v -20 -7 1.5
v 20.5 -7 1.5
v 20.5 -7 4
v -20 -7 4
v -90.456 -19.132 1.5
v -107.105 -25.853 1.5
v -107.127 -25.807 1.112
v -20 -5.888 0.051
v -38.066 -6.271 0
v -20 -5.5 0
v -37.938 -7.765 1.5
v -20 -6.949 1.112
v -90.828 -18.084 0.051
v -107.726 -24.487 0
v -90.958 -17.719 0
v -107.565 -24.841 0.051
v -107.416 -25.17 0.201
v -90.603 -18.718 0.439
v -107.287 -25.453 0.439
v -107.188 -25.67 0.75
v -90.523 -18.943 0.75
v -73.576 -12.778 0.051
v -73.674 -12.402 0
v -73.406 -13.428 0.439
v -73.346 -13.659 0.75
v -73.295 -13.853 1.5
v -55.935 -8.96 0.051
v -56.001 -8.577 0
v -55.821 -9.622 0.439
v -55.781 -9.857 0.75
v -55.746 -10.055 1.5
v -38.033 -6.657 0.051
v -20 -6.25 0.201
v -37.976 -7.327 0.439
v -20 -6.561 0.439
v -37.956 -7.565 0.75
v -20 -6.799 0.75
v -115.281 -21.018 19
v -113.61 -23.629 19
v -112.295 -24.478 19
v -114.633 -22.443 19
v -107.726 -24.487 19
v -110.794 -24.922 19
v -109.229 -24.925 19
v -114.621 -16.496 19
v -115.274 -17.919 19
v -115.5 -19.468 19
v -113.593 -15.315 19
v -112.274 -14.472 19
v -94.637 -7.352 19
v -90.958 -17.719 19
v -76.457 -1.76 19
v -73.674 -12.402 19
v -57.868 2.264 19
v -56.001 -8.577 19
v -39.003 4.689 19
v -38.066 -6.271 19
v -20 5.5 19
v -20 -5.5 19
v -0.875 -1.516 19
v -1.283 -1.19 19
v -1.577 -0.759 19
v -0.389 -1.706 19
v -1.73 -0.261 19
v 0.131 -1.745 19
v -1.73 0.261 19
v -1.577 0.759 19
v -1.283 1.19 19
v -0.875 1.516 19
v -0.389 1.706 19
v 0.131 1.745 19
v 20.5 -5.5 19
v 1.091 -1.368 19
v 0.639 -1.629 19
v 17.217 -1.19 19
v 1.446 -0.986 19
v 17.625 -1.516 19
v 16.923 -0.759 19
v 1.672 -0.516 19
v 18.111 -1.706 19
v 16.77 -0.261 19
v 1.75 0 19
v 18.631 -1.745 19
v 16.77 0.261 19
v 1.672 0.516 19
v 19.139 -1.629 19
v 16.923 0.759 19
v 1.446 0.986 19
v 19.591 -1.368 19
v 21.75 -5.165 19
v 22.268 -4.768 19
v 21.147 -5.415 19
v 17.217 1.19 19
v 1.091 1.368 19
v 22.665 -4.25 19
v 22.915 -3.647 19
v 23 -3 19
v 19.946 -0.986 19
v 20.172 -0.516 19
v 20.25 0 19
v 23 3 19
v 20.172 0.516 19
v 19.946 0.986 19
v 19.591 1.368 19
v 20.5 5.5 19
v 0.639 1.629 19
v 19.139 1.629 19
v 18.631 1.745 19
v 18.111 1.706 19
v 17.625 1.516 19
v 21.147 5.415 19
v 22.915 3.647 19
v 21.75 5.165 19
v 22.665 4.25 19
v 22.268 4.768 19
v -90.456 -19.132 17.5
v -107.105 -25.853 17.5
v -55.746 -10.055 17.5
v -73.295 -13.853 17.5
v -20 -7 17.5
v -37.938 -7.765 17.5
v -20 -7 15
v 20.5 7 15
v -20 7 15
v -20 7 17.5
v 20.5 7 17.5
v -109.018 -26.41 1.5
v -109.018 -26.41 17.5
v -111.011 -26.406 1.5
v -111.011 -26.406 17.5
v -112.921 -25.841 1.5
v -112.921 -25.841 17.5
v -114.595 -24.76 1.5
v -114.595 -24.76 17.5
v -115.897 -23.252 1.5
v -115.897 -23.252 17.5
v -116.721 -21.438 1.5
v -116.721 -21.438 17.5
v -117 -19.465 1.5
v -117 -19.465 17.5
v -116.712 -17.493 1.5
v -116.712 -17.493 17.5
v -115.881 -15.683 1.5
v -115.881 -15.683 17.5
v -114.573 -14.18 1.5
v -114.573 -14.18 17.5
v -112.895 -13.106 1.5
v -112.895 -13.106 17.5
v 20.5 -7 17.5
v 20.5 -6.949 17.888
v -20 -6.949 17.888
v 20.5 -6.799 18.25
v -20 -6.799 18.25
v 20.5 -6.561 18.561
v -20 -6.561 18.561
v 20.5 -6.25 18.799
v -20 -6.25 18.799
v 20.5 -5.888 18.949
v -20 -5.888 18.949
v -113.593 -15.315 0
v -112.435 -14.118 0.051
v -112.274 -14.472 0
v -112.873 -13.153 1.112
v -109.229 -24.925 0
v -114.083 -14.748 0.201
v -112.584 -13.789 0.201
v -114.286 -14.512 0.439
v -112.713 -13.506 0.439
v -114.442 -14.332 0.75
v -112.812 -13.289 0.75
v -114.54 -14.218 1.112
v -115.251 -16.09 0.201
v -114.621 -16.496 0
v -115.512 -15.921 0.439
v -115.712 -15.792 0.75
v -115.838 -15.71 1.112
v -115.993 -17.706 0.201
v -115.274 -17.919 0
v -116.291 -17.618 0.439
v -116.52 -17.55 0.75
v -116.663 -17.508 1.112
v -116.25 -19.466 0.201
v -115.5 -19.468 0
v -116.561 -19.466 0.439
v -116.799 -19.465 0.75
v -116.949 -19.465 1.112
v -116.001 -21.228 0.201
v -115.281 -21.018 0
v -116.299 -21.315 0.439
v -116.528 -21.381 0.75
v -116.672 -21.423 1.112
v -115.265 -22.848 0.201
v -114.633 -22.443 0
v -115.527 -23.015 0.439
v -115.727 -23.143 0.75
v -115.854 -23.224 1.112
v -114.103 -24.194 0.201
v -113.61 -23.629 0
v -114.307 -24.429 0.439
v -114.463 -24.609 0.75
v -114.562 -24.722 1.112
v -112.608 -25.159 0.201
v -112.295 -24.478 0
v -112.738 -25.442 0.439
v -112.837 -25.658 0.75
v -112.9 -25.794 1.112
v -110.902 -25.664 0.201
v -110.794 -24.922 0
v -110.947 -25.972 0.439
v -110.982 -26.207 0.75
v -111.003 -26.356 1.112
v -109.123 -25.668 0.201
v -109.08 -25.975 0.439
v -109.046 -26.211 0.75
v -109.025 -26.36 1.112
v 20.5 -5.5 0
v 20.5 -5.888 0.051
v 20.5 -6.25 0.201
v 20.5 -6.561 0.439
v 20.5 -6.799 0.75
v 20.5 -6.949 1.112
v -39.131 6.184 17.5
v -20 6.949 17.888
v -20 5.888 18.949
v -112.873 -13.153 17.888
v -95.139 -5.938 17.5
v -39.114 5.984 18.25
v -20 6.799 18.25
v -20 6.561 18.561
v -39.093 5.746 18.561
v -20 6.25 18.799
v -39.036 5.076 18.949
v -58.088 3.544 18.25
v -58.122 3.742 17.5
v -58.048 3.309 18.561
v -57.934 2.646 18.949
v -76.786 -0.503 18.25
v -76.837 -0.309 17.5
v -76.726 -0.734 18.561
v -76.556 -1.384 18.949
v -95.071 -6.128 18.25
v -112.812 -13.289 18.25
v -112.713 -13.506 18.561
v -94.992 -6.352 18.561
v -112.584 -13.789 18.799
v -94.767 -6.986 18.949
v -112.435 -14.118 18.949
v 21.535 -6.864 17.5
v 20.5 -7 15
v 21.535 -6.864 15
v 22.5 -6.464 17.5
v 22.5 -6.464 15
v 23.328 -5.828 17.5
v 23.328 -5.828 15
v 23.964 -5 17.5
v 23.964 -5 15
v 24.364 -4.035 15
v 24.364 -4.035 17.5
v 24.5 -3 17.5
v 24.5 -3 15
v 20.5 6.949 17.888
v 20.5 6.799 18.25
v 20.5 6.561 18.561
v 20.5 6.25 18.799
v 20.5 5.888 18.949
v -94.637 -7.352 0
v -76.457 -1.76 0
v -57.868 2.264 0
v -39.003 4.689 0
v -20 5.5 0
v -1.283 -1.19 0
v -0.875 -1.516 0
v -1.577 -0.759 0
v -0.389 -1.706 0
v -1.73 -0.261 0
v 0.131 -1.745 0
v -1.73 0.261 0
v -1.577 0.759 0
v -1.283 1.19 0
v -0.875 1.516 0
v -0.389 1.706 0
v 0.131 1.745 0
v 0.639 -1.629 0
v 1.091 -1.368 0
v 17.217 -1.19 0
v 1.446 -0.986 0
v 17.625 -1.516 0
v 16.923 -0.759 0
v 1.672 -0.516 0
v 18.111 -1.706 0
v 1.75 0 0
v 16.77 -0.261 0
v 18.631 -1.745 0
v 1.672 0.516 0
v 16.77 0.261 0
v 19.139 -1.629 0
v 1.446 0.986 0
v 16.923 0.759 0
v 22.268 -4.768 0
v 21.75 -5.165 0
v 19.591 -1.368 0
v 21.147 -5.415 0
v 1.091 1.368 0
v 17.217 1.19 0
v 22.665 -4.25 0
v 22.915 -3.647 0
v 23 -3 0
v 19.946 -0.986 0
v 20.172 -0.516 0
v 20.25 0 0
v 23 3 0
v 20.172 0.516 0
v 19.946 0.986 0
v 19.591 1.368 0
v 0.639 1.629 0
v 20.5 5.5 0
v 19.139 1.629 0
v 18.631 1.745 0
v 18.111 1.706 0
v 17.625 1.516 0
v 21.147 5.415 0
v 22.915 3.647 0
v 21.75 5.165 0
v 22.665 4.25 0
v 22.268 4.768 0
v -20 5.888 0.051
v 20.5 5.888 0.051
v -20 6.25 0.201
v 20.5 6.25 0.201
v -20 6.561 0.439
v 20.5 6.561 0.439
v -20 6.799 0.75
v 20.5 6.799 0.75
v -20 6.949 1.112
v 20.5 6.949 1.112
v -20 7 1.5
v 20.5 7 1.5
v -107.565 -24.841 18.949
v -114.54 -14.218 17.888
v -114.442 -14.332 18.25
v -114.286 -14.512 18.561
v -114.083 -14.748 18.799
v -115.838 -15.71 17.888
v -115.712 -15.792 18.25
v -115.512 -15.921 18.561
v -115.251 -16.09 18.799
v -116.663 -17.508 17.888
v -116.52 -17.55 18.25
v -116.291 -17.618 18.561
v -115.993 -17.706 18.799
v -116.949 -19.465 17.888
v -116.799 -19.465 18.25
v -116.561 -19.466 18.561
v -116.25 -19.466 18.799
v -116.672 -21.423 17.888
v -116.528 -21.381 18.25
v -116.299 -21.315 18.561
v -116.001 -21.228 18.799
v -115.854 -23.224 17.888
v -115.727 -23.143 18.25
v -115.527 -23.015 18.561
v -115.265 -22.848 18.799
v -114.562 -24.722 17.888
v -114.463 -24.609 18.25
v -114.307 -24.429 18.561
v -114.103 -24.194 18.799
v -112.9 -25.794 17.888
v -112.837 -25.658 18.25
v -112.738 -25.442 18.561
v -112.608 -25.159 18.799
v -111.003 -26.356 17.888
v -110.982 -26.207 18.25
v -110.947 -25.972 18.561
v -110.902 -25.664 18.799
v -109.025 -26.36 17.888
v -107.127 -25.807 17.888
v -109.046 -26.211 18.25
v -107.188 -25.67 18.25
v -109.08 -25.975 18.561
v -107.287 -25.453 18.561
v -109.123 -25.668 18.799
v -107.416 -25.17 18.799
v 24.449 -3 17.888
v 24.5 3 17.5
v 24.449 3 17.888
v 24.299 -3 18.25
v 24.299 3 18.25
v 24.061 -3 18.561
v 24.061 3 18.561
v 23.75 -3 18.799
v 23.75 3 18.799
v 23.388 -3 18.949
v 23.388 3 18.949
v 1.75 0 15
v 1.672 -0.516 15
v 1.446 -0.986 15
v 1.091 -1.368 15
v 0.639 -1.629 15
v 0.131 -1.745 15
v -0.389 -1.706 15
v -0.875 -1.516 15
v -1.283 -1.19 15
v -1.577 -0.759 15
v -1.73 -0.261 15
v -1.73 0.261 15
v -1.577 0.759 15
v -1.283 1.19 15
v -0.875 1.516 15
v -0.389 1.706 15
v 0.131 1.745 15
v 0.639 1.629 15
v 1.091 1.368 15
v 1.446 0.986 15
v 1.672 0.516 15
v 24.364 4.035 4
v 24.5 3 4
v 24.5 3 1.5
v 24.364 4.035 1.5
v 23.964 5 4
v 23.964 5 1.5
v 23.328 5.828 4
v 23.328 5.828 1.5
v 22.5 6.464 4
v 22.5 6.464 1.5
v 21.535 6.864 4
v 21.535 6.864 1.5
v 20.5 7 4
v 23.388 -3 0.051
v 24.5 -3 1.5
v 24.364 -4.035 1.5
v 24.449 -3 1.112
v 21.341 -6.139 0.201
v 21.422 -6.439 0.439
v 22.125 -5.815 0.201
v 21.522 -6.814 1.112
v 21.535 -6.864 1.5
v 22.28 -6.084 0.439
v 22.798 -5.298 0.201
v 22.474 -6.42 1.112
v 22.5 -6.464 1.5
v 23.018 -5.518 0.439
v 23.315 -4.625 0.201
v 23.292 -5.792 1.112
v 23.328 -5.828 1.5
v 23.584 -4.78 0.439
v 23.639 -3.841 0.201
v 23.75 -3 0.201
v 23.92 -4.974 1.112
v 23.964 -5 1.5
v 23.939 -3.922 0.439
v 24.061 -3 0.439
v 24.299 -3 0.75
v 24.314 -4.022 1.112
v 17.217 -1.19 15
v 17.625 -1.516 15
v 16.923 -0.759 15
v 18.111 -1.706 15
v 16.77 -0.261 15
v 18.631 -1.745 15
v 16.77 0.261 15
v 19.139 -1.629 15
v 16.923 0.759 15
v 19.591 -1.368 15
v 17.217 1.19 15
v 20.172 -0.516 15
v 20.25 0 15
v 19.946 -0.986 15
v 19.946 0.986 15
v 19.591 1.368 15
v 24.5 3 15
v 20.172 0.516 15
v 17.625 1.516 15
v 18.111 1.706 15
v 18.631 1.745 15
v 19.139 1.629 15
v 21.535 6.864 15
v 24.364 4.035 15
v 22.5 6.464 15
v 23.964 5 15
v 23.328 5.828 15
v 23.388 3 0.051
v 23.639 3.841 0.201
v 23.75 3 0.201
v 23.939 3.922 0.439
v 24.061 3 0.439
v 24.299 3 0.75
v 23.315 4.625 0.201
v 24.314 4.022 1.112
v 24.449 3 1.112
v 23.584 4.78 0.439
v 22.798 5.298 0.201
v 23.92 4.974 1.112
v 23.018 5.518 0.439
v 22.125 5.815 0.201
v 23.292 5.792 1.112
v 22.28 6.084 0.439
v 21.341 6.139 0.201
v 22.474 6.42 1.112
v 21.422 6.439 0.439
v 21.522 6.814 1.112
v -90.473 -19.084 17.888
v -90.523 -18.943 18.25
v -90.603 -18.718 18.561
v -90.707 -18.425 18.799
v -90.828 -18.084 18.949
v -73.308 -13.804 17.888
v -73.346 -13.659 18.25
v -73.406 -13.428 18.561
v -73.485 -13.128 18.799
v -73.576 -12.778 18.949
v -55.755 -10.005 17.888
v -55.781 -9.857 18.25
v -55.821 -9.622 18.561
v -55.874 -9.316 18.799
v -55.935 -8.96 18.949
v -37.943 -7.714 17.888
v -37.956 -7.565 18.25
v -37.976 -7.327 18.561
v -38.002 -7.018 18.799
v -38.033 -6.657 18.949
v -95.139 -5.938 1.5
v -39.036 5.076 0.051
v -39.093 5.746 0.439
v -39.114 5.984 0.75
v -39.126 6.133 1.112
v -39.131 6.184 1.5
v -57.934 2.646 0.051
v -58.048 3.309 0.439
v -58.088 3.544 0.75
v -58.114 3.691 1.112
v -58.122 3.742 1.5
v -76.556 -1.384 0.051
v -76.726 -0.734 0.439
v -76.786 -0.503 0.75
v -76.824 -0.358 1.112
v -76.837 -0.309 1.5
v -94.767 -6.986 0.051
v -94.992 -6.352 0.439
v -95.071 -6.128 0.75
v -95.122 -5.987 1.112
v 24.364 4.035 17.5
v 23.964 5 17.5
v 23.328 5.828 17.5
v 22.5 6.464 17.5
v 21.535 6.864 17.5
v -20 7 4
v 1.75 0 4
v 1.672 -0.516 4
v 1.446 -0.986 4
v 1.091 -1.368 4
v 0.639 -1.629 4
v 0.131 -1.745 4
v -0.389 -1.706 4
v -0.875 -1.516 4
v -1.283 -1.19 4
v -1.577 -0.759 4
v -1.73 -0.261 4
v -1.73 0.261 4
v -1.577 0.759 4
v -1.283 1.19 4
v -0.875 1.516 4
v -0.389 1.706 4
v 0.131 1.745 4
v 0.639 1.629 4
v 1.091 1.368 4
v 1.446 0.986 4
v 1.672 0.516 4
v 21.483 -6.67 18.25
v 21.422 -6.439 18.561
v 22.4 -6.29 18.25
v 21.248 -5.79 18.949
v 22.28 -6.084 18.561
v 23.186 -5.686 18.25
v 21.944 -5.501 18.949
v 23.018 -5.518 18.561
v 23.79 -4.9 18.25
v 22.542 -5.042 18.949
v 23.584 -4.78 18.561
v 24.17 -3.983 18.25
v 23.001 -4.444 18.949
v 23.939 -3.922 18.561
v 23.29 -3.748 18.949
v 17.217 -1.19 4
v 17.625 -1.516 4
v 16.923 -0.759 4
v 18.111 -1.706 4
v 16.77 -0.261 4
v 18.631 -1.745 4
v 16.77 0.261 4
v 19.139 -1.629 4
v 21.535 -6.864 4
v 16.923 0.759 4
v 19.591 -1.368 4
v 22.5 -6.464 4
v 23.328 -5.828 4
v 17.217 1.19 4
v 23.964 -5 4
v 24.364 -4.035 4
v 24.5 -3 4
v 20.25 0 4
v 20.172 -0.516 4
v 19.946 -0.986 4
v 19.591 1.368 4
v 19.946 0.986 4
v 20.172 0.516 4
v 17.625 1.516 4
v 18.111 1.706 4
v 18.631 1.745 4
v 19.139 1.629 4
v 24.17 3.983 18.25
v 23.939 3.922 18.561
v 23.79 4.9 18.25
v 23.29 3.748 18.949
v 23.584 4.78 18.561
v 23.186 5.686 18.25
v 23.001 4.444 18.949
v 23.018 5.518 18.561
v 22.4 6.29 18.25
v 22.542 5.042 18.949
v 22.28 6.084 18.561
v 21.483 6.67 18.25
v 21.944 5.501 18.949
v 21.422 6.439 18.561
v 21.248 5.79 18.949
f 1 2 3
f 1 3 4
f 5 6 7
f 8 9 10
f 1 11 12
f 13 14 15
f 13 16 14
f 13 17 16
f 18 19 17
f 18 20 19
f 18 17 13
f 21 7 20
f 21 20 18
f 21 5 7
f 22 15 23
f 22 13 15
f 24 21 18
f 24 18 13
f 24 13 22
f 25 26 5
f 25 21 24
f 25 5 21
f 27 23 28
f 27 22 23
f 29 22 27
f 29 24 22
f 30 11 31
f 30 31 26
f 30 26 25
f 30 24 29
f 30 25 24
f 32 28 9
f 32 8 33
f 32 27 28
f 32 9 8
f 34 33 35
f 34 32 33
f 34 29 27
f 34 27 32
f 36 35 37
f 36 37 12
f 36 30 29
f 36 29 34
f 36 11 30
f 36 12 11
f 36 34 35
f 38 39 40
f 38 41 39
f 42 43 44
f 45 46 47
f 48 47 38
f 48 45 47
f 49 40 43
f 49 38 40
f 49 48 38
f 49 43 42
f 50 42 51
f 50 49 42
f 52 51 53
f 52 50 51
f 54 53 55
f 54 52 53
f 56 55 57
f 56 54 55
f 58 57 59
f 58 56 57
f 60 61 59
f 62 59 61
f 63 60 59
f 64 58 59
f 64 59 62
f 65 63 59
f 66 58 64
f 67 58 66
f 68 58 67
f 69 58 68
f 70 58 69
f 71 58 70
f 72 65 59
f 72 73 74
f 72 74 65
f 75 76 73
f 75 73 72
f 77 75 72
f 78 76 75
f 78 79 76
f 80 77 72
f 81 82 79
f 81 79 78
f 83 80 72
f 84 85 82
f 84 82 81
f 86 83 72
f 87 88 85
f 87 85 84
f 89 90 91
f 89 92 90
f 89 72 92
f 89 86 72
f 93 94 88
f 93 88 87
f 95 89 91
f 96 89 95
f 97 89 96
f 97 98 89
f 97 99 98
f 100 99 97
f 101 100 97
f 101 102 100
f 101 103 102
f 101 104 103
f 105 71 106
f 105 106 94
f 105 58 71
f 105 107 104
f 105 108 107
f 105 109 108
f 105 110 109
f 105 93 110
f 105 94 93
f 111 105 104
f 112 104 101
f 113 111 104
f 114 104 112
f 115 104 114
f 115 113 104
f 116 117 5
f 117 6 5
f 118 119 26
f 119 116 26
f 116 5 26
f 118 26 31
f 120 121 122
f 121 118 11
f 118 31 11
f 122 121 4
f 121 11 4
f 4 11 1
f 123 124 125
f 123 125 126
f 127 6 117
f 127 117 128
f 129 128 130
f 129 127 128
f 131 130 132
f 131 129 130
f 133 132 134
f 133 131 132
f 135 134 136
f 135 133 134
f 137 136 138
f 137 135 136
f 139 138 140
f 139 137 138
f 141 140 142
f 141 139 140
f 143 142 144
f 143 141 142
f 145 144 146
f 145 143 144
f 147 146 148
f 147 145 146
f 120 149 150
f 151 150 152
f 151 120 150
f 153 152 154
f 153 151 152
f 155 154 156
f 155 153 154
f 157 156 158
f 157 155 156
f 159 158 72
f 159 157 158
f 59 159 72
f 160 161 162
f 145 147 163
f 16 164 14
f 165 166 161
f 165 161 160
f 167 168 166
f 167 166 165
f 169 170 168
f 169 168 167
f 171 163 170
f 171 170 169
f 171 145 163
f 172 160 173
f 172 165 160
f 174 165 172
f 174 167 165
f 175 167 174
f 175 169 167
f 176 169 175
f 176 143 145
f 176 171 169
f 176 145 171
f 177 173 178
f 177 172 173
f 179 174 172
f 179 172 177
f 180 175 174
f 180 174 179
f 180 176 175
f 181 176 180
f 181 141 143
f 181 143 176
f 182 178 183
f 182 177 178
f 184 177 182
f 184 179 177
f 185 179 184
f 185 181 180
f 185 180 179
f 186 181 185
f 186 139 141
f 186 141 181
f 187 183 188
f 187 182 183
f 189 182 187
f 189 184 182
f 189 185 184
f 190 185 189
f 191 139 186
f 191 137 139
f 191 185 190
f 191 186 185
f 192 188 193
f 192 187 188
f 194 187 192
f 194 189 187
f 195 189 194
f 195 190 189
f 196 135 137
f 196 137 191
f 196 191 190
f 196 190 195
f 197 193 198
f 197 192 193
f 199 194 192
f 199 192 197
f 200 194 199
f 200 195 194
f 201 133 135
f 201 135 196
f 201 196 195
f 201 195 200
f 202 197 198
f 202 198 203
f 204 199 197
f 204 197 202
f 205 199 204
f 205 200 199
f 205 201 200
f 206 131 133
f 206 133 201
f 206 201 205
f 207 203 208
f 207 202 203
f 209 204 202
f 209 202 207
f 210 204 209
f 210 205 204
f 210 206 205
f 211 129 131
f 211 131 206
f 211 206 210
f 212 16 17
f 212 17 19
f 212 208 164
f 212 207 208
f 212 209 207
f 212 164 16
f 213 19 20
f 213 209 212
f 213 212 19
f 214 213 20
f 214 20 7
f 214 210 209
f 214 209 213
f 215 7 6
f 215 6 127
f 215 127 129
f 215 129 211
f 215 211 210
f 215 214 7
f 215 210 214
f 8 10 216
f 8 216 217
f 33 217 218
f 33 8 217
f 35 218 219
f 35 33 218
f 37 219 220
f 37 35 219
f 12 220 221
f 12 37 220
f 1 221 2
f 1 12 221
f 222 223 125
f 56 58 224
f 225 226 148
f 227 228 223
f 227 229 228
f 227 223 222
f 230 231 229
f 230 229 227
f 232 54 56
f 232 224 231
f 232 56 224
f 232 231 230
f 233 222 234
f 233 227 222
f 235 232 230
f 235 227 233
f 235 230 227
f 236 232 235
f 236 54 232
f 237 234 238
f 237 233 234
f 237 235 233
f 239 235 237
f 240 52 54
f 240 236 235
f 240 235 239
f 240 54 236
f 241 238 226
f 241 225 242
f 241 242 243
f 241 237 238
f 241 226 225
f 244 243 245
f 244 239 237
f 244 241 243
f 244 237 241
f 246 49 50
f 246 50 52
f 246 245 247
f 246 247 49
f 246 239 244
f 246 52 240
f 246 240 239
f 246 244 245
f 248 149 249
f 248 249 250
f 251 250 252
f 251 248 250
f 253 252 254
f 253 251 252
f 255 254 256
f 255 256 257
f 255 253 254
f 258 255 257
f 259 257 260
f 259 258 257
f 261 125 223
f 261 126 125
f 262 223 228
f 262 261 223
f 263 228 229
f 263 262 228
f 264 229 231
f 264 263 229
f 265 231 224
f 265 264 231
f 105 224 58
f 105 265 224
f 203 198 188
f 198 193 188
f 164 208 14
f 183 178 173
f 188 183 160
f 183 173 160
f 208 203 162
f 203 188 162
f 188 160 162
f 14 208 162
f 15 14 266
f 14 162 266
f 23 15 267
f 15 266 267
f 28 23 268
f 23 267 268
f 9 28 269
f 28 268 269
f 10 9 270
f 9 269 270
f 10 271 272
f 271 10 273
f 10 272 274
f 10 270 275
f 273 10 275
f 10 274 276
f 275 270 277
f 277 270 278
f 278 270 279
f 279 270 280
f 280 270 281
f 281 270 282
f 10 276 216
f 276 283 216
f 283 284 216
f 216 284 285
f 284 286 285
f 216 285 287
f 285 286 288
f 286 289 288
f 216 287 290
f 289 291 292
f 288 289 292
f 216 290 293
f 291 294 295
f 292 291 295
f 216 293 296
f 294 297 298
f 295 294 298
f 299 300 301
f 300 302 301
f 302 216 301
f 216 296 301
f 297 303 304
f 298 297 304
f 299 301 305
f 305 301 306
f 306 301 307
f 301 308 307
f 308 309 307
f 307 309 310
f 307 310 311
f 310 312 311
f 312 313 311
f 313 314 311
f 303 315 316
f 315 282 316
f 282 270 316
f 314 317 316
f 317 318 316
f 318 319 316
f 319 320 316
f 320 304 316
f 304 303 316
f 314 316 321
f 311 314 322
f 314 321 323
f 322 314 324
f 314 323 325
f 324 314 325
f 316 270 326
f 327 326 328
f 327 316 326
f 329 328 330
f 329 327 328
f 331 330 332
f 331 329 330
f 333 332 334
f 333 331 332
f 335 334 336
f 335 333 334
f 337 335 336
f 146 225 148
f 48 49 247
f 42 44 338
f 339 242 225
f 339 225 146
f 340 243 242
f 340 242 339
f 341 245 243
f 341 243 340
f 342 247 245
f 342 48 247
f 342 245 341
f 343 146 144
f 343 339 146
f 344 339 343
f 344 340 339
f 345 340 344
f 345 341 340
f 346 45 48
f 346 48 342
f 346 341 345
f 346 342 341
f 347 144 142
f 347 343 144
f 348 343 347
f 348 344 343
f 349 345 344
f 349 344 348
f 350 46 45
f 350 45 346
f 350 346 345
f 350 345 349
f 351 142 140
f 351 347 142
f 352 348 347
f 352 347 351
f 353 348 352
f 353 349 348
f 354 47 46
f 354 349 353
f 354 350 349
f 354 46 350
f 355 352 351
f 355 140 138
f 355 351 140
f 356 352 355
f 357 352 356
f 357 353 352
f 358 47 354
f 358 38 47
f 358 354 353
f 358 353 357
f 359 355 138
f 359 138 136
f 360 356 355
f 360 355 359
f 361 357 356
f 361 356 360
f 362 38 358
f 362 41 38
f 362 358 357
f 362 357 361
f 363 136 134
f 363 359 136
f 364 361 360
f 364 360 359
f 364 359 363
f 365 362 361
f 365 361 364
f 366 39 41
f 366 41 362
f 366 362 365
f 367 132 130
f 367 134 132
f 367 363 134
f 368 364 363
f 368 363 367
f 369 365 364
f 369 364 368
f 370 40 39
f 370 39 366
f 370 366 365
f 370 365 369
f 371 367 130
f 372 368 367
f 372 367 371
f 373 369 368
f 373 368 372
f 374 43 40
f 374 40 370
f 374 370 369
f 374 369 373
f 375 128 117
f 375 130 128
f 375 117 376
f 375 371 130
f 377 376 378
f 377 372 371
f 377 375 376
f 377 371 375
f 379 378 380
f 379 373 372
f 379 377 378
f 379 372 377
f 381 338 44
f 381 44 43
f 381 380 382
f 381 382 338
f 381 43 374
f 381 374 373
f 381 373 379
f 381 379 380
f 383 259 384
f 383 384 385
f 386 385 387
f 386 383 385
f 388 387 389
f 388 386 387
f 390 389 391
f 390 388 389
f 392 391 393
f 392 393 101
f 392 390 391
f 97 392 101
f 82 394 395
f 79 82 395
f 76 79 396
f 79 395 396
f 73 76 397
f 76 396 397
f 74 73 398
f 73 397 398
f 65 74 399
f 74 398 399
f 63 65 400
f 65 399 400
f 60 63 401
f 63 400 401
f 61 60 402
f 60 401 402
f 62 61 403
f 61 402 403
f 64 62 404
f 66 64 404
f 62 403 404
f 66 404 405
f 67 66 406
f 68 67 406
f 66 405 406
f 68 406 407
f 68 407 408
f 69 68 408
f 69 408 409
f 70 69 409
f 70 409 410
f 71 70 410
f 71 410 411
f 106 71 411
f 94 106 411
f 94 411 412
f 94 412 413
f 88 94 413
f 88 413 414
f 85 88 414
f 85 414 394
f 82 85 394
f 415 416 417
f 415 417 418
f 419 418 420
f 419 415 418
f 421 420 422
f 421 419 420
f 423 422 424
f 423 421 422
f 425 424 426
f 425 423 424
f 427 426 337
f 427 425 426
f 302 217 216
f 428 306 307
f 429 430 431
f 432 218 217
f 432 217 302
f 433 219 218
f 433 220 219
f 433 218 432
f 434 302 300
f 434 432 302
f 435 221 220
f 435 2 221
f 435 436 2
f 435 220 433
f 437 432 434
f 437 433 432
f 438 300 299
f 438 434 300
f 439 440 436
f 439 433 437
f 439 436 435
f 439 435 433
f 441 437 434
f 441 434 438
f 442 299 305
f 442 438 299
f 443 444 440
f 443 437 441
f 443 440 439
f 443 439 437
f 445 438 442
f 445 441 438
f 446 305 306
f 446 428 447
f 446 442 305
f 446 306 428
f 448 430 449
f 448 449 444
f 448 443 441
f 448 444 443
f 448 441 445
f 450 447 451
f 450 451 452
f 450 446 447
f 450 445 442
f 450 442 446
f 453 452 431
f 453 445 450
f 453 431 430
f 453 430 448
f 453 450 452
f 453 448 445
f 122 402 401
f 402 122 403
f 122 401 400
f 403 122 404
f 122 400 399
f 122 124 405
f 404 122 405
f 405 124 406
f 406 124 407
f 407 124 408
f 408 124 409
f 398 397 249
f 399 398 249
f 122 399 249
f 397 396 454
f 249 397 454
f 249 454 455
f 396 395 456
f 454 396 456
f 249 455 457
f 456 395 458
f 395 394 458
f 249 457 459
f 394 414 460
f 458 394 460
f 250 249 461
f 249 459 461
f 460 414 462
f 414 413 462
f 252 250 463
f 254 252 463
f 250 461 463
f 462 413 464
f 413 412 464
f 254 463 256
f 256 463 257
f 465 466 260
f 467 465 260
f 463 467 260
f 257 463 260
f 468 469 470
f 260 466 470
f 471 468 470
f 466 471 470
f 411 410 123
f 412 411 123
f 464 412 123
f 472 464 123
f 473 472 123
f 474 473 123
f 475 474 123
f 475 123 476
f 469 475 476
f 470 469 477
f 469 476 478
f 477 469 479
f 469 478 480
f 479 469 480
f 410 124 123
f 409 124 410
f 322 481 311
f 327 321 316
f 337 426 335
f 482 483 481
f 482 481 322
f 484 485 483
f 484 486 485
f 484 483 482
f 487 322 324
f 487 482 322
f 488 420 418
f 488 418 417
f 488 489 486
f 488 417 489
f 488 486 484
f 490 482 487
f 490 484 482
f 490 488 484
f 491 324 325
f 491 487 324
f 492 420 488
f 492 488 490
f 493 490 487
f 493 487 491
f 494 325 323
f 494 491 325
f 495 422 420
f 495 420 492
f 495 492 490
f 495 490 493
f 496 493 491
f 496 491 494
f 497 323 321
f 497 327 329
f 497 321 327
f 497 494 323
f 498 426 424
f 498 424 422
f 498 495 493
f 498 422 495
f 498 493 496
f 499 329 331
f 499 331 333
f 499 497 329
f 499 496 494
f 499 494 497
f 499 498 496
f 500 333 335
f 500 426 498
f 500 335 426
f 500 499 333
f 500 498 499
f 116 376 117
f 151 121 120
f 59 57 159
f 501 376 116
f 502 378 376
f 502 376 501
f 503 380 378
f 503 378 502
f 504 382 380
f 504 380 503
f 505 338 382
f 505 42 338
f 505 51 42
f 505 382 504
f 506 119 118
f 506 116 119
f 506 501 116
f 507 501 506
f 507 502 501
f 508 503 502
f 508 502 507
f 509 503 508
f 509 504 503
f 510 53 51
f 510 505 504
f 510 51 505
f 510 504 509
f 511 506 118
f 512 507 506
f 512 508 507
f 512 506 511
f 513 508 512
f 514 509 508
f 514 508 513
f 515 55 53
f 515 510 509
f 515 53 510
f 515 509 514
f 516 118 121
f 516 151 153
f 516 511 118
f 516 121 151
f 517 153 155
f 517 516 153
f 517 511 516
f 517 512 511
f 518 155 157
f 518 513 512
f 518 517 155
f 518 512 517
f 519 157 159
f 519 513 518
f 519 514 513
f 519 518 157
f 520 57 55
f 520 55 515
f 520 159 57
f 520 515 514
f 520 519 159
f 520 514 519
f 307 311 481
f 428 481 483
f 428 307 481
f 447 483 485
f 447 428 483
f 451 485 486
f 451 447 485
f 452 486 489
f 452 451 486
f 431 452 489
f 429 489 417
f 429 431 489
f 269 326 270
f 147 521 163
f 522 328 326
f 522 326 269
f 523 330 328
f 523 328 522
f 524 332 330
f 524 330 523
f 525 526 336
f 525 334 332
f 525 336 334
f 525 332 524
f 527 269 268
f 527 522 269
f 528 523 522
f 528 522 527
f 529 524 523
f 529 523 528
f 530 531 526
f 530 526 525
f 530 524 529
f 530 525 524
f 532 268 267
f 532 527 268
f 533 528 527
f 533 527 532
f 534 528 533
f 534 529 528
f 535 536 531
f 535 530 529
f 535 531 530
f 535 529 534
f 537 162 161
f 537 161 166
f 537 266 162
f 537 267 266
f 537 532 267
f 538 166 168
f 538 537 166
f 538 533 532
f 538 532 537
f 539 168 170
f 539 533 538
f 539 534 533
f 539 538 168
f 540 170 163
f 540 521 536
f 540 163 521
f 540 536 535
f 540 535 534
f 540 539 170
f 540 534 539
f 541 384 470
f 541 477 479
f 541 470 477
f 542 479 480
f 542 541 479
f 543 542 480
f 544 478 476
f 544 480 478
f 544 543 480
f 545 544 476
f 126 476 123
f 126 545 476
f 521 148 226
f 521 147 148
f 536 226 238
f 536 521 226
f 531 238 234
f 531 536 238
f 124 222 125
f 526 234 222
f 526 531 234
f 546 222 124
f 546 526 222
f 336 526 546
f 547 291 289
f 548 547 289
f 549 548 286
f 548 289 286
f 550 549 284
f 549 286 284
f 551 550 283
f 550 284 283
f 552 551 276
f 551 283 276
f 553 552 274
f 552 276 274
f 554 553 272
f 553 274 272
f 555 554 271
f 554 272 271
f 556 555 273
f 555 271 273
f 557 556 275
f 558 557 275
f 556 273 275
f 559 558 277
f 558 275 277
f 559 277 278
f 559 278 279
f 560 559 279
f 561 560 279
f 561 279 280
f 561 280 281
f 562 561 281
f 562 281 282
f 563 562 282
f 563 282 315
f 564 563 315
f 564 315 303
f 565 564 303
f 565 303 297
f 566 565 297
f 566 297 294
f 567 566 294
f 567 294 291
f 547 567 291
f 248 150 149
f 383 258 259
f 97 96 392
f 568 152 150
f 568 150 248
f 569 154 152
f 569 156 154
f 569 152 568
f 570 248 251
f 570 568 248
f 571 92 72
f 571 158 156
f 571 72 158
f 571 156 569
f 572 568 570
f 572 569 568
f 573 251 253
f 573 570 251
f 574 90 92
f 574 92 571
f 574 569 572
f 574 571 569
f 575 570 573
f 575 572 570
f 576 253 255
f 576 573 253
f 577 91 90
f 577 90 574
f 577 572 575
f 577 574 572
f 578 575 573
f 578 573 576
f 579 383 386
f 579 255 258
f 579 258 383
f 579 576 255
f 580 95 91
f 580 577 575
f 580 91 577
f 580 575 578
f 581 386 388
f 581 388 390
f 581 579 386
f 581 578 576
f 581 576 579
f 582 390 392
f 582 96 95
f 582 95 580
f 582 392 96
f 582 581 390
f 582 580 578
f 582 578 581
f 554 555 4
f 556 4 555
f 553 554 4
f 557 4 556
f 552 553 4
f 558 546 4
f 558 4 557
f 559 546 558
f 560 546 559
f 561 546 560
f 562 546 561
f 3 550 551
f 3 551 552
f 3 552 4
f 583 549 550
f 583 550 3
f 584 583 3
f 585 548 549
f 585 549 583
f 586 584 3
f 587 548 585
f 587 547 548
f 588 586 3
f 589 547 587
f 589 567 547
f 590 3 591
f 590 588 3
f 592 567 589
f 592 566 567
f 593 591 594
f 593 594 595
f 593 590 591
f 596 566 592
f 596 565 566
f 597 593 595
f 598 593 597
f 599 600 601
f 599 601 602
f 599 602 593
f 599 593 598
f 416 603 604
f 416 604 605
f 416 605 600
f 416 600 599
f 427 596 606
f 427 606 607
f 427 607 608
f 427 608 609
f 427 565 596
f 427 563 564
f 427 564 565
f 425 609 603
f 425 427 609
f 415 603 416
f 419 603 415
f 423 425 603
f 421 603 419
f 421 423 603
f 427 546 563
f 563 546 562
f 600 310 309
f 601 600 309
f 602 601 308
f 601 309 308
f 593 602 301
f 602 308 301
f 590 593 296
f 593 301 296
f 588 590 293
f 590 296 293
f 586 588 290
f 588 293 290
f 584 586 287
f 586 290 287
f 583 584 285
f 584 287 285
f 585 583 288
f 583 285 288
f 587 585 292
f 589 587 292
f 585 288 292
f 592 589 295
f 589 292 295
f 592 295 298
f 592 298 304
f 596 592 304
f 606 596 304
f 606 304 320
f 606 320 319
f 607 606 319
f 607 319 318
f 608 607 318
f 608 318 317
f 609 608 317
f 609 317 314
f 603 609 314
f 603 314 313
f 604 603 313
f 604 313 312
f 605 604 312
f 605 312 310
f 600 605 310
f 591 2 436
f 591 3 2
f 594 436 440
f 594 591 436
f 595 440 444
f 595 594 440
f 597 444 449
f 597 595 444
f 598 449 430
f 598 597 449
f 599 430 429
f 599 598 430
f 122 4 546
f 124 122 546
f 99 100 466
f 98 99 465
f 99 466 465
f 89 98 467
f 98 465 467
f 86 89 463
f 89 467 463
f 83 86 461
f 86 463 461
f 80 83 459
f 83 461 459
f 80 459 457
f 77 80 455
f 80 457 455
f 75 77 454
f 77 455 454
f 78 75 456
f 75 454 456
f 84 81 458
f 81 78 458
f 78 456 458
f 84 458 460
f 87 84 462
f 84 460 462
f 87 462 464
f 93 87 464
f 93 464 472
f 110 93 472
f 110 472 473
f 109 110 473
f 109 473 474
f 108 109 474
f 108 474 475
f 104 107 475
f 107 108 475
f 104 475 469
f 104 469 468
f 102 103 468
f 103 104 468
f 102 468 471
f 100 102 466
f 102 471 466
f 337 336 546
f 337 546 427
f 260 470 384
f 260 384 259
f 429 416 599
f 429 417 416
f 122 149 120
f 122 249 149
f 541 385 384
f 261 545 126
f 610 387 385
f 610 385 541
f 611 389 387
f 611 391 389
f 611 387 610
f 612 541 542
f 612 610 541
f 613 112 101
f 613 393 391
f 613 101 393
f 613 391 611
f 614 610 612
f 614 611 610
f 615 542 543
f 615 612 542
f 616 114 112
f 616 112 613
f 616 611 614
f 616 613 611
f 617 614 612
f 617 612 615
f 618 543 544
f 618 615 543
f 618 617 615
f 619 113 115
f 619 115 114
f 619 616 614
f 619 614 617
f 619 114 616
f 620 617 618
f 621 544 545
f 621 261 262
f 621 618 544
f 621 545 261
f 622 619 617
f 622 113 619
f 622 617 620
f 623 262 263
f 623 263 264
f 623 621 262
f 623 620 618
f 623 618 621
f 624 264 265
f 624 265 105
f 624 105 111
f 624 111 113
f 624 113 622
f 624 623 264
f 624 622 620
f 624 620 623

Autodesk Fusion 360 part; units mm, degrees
sketch "Sketch1" plane through (0, 0, 0) normal (0, 0, 1) x (1, 0, 0)
  circle A0 centre (0, 0) radius 1.75
  circle A1 centre (18.5, 0) radius 1.75
  line L0 (-20, 7) -> (24.5, 7)
  line L1 (24.5, 7) -> (24.5, -7)
  line L2 (24.5, -7) -> (-20, -7)
  line L3 (-20, -7) -> (-20, 7)
  arc A2 (-20, -7) -> (-107.1054, -25.8531) centre (-20, -217.6501) ccw
  arc A3 (-20, -7) -> (-20, 7) centre (-20, 0) ccw
  arc A4 (-20, 7) -> (-112.8946, -13.106) centre (-20, -217.6501) ccw
  arc A5 (-112.8946, -13.106) -> (-107.1054, -25.8531) centre (-110, -19.4796) ccw
  arc A6 (-20, 0) -> (-110, -19.4796) centre (-20, -217.6501) ccw construction
  dimension "d1" = 3.5
  dimension "d2" = 3.5
  dimension "d3" = 18.5
  dimension "d4" = 6
  dimension "d5" = 7
  dimension "d6" = 7
  dimension "d7" = 20
extrude "Extrude1" add sketch "Sketch1" along normal blind 4 contours A0 | A1 | L3 A3 | L0 L1 L2 A3 | L3 A2 A4 A5
extrude "Extrude2" add sketch "Sketch1" along normal blind 19 contours L3 A2 A4 A5
extrude "Extrude3" add sketch "Sketch1" along normal blind 4 from surface at 15 contours A0 | A1 | L3 A3 | L0 L1 L2 A3 | L3 A2 A4 A5
extrude "Extrude4" cut sketch "Sketch1" along normal blind 35 contours A0
extrude "Extrude5" cut sketch "Sketch1" along normal blind 19 contours A1
fillet "Fillet1" radius 4 4 edges at (24.5, -7, 17) (24.5, -7, 2) (24.5, 7, 17) (24.5, 7, 2)
fillet "Fillet2" radius 1.5 16 edges at (-64.5612, -11.7672, 19) (0.25, -7, 19) (23.3284, -5.8284, 19) (24.5, 0, 19) (23.3284, 5.8284, 19) (0.25, 7, 19) (-67.5228, 1.916, 19) (-116.3735, -22.3741, 19) (-64.5612, -11.7672, 0) (0.25, -7, 0) (23.3284, -5.8284, 0) (24.5, 0, 0) (23.3284, 5.8284, 0) (0.25, 7, 0) (-67.5228, 1.916, 0) (-116.3735, -22.3741, 0)
